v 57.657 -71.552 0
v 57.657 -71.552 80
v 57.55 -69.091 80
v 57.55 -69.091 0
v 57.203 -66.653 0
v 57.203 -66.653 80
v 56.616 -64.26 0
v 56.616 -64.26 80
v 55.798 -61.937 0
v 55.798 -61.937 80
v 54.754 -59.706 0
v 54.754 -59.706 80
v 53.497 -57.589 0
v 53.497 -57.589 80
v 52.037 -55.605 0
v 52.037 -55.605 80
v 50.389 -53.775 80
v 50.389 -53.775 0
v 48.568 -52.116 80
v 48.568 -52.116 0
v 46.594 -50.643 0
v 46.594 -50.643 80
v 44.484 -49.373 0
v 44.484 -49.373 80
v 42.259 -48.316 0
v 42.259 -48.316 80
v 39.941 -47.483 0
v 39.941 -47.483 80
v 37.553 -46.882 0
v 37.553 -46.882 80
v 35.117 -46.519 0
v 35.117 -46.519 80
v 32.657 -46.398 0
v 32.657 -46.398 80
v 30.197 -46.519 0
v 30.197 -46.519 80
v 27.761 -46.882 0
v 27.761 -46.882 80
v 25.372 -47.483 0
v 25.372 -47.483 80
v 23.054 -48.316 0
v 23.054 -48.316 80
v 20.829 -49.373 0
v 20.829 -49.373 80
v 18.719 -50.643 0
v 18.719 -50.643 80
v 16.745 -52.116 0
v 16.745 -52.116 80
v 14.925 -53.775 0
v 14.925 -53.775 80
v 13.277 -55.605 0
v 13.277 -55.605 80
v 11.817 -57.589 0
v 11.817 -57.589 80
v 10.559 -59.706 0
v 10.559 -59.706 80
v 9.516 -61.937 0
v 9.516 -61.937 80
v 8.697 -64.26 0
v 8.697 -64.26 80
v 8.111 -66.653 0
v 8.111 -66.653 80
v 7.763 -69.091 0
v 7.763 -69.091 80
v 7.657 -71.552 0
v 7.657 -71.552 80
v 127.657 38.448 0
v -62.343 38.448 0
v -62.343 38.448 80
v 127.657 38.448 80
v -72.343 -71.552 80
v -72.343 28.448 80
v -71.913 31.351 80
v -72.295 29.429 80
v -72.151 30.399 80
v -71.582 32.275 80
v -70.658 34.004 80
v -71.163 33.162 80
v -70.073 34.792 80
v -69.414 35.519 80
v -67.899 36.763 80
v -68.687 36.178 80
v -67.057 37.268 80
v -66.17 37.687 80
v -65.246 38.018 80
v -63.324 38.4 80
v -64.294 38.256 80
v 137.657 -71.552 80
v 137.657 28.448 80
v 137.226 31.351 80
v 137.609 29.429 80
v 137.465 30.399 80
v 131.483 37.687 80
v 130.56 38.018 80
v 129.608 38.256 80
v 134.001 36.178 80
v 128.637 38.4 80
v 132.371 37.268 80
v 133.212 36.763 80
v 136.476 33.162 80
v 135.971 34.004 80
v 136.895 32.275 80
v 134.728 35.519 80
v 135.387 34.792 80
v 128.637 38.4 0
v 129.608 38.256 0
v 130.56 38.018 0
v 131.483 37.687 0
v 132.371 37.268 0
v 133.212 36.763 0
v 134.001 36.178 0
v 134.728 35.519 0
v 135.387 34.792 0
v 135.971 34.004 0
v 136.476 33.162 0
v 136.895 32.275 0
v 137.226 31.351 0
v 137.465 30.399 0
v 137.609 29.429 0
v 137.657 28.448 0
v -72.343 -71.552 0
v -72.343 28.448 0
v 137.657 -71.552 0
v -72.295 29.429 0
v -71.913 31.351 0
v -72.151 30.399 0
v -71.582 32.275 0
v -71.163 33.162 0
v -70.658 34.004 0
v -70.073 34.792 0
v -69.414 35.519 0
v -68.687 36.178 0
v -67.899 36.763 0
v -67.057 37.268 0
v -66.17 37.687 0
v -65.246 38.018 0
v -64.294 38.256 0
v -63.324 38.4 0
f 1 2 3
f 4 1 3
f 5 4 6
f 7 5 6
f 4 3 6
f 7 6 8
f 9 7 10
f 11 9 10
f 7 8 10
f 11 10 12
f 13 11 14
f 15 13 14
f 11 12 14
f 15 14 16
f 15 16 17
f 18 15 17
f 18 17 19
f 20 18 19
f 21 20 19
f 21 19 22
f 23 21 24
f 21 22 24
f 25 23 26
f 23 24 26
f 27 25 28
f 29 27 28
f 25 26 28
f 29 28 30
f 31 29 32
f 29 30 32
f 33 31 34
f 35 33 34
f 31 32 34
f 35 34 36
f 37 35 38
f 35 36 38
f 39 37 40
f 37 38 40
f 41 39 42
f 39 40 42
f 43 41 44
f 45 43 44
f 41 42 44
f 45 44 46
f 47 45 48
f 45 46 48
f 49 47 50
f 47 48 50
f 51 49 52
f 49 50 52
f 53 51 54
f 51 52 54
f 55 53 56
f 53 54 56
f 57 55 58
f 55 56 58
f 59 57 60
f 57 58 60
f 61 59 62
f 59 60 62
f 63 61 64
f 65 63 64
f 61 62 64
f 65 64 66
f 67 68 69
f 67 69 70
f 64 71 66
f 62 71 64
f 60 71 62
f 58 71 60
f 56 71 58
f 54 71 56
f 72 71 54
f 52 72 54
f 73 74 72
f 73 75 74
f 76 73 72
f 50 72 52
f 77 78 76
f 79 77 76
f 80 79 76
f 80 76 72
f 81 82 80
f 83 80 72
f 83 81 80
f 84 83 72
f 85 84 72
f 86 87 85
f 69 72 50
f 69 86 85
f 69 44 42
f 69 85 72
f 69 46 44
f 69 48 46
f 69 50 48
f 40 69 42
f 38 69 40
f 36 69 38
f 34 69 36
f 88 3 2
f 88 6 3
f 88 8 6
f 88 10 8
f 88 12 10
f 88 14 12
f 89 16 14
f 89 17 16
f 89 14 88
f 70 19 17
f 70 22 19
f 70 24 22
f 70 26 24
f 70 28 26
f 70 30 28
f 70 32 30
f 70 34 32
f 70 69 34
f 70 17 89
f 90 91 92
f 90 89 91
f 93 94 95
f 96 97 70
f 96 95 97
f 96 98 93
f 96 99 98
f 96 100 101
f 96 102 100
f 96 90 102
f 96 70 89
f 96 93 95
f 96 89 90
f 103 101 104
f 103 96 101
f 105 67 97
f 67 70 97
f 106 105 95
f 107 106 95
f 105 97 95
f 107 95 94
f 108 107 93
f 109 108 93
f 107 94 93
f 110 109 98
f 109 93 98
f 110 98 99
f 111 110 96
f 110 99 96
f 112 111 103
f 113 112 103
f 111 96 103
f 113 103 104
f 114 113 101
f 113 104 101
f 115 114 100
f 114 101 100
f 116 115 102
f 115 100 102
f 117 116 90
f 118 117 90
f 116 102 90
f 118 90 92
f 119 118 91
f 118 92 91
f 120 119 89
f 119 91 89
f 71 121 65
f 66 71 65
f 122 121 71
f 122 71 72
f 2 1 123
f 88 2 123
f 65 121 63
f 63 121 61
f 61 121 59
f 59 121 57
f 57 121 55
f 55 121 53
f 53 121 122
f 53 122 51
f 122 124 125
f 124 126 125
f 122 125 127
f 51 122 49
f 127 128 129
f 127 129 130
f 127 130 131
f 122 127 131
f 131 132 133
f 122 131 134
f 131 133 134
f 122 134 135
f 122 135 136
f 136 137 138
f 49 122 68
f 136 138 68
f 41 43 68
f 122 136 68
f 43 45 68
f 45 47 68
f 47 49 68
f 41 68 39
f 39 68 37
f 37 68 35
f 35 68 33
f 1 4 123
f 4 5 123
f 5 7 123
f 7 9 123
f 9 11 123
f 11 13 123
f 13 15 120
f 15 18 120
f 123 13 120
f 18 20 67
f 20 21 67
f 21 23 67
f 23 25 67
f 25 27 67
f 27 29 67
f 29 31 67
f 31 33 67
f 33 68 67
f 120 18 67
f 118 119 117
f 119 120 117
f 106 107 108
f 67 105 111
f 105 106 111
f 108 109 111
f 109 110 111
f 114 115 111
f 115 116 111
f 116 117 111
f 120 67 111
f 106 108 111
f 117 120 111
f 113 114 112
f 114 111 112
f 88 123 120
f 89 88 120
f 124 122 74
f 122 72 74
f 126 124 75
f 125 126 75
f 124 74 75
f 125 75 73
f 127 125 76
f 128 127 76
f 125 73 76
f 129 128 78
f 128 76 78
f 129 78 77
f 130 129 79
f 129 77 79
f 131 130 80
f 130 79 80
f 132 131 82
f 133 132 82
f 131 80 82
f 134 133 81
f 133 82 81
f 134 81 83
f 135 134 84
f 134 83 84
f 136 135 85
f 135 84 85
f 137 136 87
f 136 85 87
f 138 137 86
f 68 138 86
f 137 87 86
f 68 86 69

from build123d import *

# Parameters (mm, degrees)
F0_W     = 210
F0_H     = 110
F1_DEPTH = 80
F3_DEPTH = 80
F4_R     = 10


with BuildPart() as f1:
    # F0 (on Top) → F1 (new body)
    with BuildSketch(Plane.XY):
        with Locations((32.656658, -16.551609)):
            Rectangle(F0_W, F0_H)
    extrude(amount=F1_DEPTH)

    # F2 (on face) → F3 (cut)
    with BuildSketch(Plane.XY.offset(80)):
        with BuildLine():
            Line((7.656658, -71.551609), (57.656658, -71.551609))
            ThreePointArc((57.656658, -71.551609), (32.656658, -46.398145), (7.656658, -71.551609))
        make_face()
    extrude(amount=-F3_DEPTH, mode=Mode.SUBTRACT)

    # F4
    f4_edges = [f1.edges().sort_by_distance(p)[0] for p in [
        (-72.343342, 38.448391, 40),
        (137.656658, 38.448391, 40),
    ]]
    fillet(f4_edges, radius=F4_R)


solid = f1.part
